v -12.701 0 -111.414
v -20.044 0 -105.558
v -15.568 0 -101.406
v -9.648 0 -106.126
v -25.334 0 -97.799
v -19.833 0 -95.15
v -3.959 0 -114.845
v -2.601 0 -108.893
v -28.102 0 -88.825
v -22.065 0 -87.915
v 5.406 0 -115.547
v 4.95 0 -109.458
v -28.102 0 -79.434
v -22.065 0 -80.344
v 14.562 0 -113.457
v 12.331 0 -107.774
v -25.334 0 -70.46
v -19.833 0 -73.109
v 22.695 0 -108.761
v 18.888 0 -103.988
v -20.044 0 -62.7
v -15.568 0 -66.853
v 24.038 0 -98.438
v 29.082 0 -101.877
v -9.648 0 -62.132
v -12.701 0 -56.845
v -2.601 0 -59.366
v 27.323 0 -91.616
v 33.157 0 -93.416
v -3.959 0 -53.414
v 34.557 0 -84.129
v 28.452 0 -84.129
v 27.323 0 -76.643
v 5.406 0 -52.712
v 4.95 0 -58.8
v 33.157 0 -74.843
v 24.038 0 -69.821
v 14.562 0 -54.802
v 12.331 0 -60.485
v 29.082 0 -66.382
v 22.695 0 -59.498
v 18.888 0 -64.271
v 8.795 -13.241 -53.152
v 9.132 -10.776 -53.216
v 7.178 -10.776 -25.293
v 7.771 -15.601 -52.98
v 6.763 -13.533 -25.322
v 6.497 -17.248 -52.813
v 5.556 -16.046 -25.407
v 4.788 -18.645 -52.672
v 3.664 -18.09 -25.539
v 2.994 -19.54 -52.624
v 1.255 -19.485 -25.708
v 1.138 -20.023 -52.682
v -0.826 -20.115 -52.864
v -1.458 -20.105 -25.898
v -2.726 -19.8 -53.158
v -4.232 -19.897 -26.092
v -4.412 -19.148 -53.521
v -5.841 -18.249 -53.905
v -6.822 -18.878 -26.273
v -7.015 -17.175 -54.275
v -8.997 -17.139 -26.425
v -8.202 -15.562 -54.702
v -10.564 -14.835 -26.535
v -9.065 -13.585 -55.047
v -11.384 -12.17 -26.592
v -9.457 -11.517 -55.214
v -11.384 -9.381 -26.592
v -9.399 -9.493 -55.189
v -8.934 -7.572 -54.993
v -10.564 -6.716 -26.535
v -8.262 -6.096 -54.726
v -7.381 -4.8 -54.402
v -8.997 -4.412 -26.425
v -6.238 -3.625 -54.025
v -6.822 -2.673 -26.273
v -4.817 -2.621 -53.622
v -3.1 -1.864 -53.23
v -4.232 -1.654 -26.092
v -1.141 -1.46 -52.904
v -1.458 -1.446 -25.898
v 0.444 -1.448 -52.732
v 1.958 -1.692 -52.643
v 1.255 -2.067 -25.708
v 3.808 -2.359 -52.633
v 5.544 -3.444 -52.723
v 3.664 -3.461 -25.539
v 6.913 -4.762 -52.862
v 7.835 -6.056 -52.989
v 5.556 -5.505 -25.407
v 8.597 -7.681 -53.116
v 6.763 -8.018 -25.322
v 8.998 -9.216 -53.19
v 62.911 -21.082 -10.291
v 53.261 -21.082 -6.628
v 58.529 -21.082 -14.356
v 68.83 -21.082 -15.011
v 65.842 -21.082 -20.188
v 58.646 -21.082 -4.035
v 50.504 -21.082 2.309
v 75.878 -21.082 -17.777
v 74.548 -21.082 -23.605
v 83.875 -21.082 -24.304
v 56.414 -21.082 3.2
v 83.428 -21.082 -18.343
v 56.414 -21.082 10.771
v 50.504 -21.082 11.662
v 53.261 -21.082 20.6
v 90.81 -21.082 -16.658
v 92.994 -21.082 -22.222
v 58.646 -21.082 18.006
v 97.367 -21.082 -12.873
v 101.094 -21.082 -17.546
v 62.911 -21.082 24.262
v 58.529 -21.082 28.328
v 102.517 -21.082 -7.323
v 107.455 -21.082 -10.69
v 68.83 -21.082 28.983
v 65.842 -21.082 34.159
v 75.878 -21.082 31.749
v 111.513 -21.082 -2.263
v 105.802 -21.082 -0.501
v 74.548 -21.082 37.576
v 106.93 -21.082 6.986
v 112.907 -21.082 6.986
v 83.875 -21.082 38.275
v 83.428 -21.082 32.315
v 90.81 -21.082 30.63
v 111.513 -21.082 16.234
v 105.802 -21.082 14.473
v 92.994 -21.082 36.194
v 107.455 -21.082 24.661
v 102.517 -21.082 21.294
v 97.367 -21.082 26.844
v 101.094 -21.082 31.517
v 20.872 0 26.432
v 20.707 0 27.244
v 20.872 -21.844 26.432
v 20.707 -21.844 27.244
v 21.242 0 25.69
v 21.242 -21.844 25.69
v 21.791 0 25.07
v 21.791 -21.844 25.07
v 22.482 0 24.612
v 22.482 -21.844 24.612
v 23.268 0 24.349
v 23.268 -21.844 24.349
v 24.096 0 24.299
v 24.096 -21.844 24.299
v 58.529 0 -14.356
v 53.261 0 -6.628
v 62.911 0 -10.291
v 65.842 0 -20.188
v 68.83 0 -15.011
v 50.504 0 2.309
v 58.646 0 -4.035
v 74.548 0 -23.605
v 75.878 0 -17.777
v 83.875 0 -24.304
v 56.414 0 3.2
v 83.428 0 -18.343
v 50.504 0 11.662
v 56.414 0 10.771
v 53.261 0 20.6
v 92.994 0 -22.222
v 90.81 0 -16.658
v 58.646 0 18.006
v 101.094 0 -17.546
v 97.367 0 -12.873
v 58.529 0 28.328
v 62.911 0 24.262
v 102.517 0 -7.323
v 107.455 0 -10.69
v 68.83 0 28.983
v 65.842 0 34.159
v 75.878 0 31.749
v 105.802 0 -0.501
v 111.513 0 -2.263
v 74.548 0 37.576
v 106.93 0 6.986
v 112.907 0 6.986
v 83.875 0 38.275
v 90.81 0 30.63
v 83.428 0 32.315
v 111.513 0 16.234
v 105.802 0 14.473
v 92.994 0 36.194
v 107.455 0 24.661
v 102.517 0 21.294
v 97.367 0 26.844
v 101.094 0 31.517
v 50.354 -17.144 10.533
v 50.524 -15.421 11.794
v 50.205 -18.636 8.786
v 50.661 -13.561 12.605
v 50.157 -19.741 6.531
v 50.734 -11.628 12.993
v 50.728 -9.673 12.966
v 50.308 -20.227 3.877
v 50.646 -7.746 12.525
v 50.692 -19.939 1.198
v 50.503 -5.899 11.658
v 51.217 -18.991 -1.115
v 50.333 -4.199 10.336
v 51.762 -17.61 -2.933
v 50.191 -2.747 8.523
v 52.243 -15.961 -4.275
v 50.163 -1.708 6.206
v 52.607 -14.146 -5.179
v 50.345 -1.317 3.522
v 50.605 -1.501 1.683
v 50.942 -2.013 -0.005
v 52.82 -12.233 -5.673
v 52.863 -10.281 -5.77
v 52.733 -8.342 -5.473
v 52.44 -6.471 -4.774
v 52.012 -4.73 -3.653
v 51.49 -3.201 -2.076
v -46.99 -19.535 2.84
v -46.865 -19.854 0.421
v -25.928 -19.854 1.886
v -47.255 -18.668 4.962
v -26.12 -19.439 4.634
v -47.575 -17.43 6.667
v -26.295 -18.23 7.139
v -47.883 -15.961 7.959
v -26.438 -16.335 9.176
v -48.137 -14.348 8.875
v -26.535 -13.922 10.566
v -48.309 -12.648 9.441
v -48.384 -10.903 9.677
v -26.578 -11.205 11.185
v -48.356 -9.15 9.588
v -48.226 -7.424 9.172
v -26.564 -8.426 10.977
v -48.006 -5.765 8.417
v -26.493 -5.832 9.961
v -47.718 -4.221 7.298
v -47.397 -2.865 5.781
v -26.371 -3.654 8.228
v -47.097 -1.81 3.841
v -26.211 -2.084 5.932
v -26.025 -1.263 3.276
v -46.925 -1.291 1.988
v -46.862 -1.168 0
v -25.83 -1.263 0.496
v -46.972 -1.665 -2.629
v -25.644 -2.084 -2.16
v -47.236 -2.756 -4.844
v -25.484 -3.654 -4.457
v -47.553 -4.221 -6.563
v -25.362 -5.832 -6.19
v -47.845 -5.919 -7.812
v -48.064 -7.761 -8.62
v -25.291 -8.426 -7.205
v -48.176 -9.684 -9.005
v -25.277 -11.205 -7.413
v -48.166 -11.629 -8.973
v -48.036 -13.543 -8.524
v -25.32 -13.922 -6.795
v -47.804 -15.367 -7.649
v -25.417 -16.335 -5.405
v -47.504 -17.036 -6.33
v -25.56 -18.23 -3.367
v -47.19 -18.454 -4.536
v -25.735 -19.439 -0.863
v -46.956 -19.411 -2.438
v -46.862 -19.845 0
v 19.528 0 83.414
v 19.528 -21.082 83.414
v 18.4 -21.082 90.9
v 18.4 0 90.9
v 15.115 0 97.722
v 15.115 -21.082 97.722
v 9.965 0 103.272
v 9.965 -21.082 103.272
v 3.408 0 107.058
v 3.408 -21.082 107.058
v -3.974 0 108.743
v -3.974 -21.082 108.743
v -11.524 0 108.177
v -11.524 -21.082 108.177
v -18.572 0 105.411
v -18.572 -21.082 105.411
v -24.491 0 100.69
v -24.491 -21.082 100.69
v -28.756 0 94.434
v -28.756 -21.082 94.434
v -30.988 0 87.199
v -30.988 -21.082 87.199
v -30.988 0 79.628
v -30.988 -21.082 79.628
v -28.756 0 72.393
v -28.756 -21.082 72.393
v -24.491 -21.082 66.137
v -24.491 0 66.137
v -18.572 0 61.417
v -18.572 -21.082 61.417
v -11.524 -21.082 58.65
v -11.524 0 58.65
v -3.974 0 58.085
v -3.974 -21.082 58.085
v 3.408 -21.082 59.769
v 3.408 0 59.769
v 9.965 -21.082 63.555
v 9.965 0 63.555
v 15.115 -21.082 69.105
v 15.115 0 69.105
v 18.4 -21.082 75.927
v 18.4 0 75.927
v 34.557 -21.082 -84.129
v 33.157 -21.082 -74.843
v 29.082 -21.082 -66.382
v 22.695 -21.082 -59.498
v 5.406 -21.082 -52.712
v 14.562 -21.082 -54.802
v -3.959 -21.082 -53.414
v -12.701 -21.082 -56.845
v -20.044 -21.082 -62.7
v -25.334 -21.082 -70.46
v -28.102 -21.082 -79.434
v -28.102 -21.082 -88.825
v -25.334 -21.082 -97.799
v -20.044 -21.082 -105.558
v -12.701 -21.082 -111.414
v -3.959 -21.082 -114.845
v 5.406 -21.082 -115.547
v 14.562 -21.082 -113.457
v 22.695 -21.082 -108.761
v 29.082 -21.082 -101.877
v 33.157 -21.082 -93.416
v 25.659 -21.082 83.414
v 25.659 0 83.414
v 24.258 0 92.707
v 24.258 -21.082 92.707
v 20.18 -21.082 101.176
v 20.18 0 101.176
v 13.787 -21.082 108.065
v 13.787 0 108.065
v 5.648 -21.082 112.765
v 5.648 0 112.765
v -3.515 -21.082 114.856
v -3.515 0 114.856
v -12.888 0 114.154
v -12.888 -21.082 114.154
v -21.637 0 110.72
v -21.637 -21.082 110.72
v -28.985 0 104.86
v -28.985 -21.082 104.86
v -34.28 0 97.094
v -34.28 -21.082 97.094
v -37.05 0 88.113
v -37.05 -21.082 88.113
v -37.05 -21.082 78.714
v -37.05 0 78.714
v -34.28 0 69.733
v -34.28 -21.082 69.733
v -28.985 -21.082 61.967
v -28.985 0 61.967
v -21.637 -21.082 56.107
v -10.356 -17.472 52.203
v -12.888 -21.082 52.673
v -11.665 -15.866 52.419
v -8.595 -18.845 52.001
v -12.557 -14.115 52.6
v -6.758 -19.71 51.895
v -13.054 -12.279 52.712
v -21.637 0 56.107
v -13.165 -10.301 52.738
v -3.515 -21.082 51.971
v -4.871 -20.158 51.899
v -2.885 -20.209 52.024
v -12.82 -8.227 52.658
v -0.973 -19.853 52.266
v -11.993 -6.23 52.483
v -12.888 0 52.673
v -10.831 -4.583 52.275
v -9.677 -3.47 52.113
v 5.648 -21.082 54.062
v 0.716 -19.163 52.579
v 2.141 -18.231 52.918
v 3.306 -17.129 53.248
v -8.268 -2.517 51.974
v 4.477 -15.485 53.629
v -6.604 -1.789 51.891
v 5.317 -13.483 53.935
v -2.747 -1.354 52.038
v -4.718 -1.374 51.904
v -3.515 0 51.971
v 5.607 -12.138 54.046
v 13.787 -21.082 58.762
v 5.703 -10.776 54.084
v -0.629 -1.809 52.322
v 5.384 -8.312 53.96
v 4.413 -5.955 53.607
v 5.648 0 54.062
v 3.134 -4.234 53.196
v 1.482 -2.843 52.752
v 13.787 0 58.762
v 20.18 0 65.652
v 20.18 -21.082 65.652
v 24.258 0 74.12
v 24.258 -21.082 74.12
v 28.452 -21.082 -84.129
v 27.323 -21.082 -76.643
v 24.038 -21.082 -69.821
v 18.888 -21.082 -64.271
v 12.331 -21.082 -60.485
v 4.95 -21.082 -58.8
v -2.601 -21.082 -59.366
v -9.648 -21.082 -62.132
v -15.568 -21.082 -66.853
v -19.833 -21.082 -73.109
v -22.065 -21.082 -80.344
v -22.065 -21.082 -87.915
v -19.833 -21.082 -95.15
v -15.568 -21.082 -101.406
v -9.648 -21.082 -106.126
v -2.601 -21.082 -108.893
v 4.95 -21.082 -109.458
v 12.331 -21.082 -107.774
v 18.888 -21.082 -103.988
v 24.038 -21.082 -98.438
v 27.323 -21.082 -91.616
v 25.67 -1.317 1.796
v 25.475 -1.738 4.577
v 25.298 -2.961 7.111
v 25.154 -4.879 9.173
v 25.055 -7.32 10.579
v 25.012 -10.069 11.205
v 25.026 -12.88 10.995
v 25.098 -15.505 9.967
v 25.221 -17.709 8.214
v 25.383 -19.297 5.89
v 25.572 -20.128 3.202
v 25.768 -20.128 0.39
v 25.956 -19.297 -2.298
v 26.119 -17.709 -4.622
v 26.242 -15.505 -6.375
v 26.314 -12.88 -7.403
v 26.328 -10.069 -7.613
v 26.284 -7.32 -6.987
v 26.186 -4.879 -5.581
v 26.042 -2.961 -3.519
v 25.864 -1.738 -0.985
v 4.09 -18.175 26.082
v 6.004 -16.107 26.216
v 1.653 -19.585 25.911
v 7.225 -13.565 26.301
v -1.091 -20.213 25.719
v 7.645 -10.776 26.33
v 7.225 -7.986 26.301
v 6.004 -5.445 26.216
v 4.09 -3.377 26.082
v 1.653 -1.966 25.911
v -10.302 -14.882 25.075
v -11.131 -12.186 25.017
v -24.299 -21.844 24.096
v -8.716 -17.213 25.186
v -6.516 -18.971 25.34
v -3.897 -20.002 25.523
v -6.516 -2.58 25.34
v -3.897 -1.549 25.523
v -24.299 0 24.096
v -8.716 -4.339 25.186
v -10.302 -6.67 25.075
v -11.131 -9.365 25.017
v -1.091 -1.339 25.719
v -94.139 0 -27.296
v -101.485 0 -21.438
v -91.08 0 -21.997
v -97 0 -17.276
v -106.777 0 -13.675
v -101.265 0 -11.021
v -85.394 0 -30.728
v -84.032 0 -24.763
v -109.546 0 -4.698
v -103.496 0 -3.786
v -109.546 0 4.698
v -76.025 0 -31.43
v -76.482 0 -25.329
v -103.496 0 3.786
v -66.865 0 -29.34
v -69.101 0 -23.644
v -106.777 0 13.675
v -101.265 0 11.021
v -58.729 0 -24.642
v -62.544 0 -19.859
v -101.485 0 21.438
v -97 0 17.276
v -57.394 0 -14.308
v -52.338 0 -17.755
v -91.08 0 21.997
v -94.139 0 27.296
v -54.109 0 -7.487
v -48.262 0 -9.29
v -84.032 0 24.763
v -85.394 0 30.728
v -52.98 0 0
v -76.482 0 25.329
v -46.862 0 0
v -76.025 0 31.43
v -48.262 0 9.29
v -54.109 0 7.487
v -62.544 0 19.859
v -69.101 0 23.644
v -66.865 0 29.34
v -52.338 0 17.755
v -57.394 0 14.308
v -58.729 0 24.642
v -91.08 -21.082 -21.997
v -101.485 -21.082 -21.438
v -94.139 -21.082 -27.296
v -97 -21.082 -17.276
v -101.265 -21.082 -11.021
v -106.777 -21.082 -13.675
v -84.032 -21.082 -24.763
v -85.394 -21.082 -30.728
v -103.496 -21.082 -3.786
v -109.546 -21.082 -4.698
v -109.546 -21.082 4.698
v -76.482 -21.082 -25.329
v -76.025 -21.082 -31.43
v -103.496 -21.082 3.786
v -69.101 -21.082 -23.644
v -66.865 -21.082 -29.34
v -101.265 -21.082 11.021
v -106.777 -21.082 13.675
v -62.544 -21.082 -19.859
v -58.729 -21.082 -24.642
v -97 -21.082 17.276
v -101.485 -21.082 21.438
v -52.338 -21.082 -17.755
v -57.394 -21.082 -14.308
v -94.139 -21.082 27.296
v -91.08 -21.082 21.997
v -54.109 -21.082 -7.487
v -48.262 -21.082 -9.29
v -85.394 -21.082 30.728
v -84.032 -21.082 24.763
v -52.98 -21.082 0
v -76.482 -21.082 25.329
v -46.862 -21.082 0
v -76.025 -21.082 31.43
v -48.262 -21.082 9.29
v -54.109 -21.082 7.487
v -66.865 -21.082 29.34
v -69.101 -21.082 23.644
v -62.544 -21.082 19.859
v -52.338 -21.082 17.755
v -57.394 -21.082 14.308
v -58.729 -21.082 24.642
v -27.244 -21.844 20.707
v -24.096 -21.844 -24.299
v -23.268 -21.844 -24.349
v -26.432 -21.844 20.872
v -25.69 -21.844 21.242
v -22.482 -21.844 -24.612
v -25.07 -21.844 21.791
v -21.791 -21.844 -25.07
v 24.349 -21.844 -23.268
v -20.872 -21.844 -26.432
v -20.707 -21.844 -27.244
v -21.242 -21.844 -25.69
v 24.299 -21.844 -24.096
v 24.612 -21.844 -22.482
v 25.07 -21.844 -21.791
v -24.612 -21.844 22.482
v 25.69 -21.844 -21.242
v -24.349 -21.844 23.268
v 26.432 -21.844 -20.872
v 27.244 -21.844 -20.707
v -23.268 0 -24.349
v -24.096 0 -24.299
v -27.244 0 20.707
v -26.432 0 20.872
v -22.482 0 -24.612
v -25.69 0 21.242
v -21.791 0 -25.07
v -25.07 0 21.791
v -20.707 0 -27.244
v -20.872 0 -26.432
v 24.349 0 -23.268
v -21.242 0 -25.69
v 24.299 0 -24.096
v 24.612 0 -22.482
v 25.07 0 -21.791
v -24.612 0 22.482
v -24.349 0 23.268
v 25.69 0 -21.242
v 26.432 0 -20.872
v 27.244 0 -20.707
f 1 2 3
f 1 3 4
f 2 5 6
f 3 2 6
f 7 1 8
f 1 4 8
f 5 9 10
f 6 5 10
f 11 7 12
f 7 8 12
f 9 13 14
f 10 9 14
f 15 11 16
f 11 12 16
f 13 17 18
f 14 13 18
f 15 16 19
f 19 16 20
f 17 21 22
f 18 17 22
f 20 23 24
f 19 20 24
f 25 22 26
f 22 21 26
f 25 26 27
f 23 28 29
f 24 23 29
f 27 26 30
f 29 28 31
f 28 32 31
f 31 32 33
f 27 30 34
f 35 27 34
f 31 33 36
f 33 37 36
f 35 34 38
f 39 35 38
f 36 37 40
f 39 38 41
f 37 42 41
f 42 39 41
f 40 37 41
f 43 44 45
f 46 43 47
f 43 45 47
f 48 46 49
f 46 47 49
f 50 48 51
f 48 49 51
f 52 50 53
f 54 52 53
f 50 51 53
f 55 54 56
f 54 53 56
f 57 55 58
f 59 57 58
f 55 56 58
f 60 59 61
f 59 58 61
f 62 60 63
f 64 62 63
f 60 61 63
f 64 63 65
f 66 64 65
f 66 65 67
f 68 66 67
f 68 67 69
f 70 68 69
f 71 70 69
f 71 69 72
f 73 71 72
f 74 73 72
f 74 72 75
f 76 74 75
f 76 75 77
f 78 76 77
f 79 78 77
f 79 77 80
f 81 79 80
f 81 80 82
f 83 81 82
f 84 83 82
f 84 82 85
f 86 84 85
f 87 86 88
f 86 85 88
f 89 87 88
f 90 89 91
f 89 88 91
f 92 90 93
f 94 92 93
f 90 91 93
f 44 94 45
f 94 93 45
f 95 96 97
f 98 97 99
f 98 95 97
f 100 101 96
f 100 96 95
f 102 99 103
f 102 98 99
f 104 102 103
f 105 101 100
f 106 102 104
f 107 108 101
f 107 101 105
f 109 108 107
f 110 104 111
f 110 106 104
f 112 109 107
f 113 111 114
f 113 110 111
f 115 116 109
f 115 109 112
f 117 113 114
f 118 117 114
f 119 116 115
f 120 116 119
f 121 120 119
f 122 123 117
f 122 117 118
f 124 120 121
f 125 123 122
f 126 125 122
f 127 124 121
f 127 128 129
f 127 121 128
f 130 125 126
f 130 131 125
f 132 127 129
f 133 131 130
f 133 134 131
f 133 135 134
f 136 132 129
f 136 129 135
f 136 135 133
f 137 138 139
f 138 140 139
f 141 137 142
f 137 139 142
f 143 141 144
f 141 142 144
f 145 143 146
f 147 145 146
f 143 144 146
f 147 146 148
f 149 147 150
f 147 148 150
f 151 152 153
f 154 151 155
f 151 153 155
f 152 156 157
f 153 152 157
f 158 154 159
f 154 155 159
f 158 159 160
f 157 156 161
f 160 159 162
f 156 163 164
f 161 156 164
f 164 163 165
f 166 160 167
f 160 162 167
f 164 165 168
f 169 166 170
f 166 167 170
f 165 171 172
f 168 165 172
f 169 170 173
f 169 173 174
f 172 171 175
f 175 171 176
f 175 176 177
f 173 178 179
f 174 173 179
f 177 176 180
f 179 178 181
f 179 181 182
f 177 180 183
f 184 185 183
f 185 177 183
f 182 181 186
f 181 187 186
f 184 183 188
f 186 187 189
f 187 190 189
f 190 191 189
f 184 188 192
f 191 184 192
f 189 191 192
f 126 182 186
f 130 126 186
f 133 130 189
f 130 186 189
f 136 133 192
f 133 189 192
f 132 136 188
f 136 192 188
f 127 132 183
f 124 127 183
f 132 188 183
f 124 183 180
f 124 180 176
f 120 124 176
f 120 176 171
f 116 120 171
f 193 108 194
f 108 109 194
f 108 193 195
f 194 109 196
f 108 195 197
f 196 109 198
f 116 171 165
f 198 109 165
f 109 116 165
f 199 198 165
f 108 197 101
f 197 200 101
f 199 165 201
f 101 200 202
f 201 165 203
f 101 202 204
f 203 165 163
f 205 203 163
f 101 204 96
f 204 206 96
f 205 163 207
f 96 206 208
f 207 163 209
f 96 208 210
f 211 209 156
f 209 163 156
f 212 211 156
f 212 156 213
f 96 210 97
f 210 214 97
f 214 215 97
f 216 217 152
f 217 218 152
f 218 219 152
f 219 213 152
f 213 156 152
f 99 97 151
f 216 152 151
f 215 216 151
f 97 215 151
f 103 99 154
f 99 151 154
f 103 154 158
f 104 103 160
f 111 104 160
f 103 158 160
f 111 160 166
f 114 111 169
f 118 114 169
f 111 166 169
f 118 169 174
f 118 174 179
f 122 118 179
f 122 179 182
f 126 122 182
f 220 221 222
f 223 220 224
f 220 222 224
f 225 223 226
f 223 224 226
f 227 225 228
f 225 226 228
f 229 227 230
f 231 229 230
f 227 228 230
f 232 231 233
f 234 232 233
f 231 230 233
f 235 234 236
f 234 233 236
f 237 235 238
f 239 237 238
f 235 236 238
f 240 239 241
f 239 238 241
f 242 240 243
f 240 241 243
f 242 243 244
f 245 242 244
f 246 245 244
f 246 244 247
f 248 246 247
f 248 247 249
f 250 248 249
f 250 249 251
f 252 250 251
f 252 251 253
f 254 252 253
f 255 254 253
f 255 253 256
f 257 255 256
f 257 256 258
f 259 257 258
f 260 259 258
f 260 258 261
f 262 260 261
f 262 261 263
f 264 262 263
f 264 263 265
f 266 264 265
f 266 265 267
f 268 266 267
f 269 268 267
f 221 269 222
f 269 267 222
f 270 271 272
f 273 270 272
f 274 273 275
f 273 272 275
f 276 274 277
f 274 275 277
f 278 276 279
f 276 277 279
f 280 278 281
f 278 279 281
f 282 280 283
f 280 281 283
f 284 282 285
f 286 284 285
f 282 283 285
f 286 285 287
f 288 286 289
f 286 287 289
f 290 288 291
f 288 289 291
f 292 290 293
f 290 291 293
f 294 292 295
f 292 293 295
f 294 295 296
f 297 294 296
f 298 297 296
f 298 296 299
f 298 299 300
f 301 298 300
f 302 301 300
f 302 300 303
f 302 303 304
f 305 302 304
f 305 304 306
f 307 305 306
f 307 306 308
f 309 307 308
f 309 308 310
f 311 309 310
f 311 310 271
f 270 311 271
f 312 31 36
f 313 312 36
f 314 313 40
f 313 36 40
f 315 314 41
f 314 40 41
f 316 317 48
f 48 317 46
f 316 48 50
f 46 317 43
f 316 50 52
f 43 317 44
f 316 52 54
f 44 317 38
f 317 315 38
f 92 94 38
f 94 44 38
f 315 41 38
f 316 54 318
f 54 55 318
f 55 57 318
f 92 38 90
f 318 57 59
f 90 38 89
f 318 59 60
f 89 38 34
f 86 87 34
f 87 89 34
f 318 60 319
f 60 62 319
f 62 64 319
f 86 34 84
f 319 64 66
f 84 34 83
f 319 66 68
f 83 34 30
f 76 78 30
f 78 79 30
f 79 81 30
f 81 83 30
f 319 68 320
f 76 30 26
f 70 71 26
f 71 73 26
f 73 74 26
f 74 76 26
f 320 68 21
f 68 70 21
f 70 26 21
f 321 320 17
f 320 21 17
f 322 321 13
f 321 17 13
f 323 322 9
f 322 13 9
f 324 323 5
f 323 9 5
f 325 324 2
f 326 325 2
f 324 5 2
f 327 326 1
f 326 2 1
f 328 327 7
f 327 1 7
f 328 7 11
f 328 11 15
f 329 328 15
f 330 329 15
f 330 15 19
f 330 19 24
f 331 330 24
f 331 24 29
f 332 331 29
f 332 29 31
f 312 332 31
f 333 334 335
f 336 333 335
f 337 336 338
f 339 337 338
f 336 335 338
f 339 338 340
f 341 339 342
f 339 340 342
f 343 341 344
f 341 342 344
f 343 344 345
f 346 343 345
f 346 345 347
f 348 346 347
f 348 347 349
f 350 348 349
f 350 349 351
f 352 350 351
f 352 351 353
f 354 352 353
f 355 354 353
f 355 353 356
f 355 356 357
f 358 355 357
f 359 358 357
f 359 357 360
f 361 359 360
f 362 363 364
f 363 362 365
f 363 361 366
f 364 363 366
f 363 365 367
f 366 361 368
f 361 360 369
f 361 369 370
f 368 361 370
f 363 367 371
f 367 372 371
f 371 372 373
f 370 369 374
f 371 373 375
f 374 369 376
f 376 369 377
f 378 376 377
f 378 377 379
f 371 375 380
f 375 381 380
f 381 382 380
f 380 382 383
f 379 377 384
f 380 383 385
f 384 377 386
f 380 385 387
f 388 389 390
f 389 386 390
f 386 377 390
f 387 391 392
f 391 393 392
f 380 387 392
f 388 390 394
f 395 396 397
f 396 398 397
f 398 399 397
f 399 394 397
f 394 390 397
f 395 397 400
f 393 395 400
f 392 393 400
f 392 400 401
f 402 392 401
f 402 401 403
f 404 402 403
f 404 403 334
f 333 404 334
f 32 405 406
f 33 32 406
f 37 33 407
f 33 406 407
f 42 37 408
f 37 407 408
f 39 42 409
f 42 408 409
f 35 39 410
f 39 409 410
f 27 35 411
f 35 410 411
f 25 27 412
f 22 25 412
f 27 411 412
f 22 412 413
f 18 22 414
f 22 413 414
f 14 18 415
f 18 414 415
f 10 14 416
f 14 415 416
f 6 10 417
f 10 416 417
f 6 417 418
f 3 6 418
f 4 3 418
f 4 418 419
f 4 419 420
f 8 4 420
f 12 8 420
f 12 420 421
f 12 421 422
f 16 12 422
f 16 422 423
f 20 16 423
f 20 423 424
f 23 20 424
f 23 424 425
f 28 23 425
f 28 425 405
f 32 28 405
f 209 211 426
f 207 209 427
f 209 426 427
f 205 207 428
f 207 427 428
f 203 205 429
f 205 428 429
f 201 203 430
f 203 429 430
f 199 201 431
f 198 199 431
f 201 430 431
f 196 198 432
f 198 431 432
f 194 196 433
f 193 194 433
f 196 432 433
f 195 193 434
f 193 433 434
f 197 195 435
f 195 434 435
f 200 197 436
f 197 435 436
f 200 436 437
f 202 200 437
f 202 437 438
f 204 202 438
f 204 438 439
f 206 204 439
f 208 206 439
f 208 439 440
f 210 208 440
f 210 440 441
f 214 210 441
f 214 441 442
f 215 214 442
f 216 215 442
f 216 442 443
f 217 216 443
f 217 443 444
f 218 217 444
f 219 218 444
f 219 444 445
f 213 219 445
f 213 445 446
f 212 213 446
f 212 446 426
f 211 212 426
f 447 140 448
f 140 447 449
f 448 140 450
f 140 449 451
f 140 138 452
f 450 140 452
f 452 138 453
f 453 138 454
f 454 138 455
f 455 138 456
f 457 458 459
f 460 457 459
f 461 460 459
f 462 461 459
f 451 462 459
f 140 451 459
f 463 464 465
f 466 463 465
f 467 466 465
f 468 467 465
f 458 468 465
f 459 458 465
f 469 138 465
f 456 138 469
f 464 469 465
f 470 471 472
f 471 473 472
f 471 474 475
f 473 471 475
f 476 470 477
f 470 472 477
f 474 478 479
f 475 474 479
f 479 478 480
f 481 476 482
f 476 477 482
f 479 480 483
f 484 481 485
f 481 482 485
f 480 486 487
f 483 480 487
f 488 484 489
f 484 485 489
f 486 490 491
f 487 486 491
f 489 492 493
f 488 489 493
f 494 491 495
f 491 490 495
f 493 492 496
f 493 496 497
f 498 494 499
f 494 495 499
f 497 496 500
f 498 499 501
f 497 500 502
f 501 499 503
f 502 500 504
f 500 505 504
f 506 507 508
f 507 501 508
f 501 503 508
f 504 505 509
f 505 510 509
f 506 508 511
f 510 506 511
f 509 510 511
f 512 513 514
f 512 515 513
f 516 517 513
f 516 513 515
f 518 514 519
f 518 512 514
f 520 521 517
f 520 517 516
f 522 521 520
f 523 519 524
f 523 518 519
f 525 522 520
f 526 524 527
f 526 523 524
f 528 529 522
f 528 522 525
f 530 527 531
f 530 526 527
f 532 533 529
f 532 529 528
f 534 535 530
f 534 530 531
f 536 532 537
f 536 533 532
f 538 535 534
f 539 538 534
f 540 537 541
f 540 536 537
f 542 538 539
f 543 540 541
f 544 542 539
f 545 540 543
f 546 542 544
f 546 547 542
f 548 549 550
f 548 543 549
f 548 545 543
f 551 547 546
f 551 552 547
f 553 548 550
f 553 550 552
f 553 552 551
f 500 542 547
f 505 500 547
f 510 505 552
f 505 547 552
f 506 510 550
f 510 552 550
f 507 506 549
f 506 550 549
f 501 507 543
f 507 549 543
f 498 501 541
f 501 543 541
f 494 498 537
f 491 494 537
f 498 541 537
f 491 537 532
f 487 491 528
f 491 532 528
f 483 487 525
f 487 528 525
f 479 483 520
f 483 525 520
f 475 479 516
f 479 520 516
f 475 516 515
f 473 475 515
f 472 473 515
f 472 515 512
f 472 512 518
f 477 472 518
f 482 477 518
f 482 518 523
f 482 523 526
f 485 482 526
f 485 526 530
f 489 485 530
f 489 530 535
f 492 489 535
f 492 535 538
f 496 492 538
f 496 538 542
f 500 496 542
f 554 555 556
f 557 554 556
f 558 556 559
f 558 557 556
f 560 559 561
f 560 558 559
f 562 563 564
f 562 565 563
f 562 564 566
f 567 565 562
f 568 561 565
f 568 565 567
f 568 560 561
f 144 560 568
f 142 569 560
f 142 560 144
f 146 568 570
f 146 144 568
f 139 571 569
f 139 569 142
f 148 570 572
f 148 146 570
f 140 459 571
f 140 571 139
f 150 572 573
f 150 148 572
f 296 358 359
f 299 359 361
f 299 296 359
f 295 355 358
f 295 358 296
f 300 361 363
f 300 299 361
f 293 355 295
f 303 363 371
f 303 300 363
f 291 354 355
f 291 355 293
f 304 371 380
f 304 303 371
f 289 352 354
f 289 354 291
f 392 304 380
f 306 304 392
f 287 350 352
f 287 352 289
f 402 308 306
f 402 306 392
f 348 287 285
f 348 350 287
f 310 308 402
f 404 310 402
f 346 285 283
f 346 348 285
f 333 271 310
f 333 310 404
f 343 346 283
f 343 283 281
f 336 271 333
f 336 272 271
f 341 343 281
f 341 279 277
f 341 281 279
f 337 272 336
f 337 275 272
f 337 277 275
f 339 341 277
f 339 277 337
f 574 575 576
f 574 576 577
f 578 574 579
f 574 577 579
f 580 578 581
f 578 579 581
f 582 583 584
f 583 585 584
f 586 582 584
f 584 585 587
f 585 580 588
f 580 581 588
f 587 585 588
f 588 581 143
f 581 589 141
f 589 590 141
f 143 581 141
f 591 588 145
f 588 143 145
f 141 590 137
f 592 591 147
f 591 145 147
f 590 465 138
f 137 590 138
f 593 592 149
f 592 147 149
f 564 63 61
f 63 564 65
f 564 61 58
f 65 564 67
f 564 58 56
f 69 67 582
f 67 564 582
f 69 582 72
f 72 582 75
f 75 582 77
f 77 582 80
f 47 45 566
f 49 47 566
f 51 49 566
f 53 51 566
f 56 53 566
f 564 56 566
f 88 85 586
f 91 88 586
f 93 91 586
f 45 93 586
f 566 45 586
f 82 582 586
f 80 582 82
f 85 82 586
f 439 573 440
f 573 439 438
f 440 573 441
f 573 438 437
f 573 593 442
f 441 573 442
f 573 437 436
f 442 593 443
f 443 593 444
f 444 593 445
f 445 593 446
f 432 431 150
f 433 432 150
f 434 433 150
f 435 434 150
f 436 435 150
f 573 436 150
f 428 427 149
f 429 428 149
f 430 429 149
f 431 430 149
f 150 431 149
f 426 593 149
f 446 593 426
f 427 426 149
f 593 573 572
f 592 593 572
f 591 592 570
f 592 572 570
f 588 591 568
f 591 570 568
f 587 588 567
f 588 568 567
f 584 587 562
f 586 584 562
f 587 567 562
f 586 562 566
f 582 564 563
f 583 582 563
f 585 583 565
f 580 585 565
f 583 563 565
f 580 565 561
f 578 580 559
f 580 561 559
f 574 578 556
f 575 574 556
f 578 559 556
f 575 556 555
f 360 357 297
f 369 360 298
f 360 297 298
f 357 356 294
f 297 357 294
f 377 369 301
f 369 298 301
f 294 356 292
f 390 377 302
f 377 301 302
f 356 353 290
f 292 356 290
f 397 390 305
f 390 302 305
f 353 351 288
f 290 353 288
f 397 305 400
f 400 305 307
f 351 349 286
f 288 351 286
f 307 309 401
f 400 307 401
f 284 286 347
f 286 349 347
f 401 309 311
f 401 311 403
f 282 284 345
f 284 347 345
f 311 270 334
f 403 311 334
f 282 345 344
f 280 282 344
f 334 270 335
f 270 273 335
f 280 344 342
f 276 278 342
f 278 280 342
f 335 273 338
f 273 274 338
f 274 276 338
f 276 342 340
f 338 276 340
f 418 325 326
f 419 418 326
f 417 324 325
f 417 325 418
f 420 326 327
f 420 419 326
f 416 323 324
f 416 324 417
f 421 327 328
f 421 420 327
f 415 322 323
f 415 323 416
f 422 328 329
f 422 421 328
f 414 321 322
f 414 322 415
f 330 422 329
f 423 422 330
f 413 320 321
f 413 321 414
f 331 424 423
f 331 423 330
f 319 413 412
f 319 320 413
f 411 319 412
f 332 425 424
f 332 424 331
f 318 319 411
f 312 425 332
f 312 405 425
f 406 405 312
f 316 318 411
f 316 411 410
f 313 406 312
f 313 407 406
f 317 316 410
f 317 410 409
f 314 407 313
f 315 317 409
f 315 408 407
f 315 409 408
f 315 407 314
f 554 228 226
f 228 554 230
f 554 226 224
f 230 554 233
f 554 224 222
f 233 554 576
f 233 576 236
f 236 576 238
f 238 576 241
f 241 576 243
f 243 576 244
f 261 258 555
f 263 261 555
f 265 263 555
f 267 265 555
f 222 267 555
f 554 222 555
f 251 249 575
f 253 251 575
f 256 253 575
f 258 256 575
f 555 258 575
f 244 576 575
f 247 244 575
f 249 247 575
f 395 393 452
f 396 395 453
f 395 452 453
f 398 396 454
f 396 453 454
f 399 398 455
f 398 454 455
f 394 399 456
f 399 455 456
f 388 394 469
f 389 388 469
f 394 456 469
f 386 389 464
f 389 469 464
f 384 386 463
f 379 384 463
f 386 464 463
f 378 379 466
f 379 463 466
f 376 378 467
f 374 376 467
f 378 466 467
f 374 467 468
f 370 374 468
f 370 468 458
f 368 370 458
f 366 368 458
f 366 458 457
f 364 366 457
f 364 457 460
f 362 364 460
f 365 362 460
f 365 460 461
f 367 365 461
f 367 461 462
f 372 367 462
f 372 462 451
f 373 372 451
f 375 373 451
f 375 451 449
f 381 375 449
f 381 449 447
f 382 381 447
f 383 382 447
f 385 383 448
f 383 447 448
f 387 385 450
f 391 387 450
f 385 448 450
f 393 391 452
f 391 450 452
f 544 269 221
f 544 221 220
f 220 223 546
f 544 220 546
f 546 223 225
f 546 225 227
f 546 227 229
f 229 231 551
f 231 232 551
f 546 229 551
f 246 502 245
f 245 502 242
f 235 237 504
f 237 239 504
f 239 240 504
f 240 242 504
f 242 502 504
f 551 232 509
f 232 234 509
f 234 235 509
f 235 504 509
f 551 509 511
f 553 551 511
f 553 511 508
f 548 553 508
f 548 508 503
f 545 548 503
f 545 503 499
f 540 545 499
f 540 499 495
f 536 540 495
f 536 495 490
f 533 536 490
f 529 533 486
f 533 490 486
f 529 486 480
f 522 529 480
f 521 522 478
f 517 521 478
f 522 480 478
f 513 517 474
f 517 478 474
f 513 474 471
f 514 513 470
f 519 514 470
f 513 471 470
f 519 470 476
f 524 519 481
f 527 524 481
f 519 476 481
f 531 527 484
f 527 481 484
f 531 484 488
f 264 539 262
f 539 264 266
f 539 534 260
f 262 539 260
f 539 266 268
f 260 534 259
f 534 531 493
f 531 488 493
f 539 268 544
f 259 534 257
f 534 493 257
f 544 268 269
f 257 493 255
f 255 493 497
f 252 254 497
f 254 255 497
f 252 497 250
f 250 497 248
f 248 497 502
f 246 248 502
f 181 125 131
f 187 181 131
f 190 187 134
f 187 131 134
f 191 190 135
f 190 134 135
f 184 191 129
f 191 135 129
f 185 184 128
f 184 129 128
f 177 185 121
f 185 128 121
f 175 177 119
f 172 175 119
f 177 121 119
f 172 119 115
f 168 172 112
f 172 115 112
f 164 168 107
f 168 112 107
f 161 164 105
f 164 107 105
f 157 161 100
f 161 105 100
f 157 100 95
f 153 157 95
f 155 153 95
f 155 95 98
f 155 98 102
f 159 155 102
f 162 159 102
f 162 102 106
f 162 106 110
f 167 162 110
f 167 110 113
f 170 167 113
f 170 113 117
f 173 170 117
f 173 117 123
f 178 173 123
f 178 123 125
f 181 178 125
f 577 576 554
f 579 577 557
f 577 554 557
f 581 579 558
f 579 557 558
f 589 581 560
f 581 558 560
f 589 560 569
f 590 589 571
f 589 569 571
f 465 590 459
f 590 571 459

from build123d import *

# Parameters (mm, degrees)
F1_DEPTH  = 21.844
F5_R      = 9.3558336569
F6_DEPTH  = 58.42
F3_R      = 9.4583600755
F7_DEPTH  = 55.626
F4_R      = 9.3478497533
F8_DEPTH  = 52.832
F2_R      = 9.4635805484
F9_DEPTH  = 58.42
F12_R     = 31.3770390823
F10_R     = 31.5053231156
F11_R     = 31.5183409025
F13_R     = 31.5308798418
F14_DEPTH = 21.082
F21_D     = 6.35
F23_D     = 50.8
F25_D     = 50.8
F27_D     = 50.8
F29_D     = 50.8


# Not quite as in the source:
# - the program builds the solid bodies; features that only make, move or delete a surface that nothing else refers to are left out


with BuildPart() as f1:
    # F0 (on Front) → F1 (new body)
    with BuildSketch(Plane.XZ):
        Polygon((23.8739177585, 27.4659190327), (-27.4659190327, 23.8739177585), (-23.8739177585, -27.4659190327), (27.4659190327, -23.8739177585), align=None)
    extrude(amount=F1_DEPTH)

    # F5 (on face) → F6 (join)
    with BuildSketch(Plane(origin=(1.7960006371, 0, -25.6699183956), x_dir=(0.9975613857, 0, 0.0697945687), z_dir=(0.0697945687, 0, -0.9975613857))):
        with Locations((-3.9608110674, 10.7757570222)):
            Circle(F5_R)
    extrude(amount=F6_DEPTH)

    # F3 (on face) → F7 (join)
    with BuildSketch(Plane(origin=(25.6699183956, 0, 1.7960006371), x_dir=(0, 1, 0), z_dir=(0.9975613857, 0, 0.0697945687))):
        with Locations((-10.7757570222, 0)):
            Circle(F3_R)
    extrude(amount=F7_DEPTH)

    # F4 (on face) → F8 (join)
    with BuildSketch(Plane(origin=(-25.6699183956, 0, -1.7960006371), x_dir=(0, -1, 0), z_dir=(-0.9975613857, 0, -0.0697945687))):
        with Locations((10.5063626543, 3.6907584872)):
            Circle(F4_R)
    extrude(amount=F8_DEPTH)

    # F2 (on face) → F9 (join)
    with BuildSketch(Plane(origin=(-1.7960006371, 0, 25.6699183956), x_dir=(0.9975613857, 0, 0.0697945687), z_dir=(-0.0697945687, 0, 0.9975613857))):
        with Locations((0, -10.7757570222)):
            Circle(F2_R)
    extrude(amount=F9_DEPTH)

    # F12 (on Front) + F10 (on Front) + F11 (on Front) + F13 (on Front) → F14 (join)
    with BuildSketch(Plane.XZ):
        with Locations((81.530354917, 6.9857356139)):
            Circle(F12_R)
    with BuildSketch(Plane.XZ):
        with Locations((3.051524749, -84.1294080019)):
            Circle(F10_R)
    with BuildSketch(Plane.XZ):
        with Locations((-78.3801749349, 0)):
            Circle(F11_R)
    with BuildSketch(Plane.XZ):
        with Locations((-5.8717224747, 83.4135636687)):
            Circle(F13_R)
    extrude(amount=F14_DEPTH)

    # F21 (through all)
    with Locations(Plane(origin=(0, 0, 0), x_dir=(-1, 0, 0), z_dir=(0, 1, 0))):
        with Locations((23.8739177585, -27.4659190327), (-27.4659190327, -23.8739177585), (-23.8739177585, 27.4659190327), (27.4659190327, 23.8739177585)):
            Hole(F21_D / 2)

    # F23 (through all)
    with Locations(Plane(origin=(0, 0, 0), x_dir=(-1, 0, 0), z_dir=(0, 1, 0))):
        with Locations((5.8717224747, 83.4135636687)):
            Hole(F23_D / 2)

    # F25 (through all)
    with Locations(Plane(origin=(0, 0, 0), x_dir=(-1, 0, 0), z_dir=(0, 1, 0))):
        with Locations((-81.530354917, 6.9857356139)):
            Hole(F25_D / 2)

    # F27 (through all)
    with Locations(Plane(origin=(0, 0, 0), x_dir=(-1, 0, 0), z_dir=(0, 1, 0))):
        with Locations((78.3801749349, 0)):
            Hole(F27_D / 2)

    # F29 (through all)
    with Locations(Plane(origin=(0, 0, 0), x_dir=(-1, 0, 0), z_dir=(0, 1, 0))):
        with Locations((-3.051524749, -84.1294080019)):
            Hole(F29_D / 2)


solid = f1.part
